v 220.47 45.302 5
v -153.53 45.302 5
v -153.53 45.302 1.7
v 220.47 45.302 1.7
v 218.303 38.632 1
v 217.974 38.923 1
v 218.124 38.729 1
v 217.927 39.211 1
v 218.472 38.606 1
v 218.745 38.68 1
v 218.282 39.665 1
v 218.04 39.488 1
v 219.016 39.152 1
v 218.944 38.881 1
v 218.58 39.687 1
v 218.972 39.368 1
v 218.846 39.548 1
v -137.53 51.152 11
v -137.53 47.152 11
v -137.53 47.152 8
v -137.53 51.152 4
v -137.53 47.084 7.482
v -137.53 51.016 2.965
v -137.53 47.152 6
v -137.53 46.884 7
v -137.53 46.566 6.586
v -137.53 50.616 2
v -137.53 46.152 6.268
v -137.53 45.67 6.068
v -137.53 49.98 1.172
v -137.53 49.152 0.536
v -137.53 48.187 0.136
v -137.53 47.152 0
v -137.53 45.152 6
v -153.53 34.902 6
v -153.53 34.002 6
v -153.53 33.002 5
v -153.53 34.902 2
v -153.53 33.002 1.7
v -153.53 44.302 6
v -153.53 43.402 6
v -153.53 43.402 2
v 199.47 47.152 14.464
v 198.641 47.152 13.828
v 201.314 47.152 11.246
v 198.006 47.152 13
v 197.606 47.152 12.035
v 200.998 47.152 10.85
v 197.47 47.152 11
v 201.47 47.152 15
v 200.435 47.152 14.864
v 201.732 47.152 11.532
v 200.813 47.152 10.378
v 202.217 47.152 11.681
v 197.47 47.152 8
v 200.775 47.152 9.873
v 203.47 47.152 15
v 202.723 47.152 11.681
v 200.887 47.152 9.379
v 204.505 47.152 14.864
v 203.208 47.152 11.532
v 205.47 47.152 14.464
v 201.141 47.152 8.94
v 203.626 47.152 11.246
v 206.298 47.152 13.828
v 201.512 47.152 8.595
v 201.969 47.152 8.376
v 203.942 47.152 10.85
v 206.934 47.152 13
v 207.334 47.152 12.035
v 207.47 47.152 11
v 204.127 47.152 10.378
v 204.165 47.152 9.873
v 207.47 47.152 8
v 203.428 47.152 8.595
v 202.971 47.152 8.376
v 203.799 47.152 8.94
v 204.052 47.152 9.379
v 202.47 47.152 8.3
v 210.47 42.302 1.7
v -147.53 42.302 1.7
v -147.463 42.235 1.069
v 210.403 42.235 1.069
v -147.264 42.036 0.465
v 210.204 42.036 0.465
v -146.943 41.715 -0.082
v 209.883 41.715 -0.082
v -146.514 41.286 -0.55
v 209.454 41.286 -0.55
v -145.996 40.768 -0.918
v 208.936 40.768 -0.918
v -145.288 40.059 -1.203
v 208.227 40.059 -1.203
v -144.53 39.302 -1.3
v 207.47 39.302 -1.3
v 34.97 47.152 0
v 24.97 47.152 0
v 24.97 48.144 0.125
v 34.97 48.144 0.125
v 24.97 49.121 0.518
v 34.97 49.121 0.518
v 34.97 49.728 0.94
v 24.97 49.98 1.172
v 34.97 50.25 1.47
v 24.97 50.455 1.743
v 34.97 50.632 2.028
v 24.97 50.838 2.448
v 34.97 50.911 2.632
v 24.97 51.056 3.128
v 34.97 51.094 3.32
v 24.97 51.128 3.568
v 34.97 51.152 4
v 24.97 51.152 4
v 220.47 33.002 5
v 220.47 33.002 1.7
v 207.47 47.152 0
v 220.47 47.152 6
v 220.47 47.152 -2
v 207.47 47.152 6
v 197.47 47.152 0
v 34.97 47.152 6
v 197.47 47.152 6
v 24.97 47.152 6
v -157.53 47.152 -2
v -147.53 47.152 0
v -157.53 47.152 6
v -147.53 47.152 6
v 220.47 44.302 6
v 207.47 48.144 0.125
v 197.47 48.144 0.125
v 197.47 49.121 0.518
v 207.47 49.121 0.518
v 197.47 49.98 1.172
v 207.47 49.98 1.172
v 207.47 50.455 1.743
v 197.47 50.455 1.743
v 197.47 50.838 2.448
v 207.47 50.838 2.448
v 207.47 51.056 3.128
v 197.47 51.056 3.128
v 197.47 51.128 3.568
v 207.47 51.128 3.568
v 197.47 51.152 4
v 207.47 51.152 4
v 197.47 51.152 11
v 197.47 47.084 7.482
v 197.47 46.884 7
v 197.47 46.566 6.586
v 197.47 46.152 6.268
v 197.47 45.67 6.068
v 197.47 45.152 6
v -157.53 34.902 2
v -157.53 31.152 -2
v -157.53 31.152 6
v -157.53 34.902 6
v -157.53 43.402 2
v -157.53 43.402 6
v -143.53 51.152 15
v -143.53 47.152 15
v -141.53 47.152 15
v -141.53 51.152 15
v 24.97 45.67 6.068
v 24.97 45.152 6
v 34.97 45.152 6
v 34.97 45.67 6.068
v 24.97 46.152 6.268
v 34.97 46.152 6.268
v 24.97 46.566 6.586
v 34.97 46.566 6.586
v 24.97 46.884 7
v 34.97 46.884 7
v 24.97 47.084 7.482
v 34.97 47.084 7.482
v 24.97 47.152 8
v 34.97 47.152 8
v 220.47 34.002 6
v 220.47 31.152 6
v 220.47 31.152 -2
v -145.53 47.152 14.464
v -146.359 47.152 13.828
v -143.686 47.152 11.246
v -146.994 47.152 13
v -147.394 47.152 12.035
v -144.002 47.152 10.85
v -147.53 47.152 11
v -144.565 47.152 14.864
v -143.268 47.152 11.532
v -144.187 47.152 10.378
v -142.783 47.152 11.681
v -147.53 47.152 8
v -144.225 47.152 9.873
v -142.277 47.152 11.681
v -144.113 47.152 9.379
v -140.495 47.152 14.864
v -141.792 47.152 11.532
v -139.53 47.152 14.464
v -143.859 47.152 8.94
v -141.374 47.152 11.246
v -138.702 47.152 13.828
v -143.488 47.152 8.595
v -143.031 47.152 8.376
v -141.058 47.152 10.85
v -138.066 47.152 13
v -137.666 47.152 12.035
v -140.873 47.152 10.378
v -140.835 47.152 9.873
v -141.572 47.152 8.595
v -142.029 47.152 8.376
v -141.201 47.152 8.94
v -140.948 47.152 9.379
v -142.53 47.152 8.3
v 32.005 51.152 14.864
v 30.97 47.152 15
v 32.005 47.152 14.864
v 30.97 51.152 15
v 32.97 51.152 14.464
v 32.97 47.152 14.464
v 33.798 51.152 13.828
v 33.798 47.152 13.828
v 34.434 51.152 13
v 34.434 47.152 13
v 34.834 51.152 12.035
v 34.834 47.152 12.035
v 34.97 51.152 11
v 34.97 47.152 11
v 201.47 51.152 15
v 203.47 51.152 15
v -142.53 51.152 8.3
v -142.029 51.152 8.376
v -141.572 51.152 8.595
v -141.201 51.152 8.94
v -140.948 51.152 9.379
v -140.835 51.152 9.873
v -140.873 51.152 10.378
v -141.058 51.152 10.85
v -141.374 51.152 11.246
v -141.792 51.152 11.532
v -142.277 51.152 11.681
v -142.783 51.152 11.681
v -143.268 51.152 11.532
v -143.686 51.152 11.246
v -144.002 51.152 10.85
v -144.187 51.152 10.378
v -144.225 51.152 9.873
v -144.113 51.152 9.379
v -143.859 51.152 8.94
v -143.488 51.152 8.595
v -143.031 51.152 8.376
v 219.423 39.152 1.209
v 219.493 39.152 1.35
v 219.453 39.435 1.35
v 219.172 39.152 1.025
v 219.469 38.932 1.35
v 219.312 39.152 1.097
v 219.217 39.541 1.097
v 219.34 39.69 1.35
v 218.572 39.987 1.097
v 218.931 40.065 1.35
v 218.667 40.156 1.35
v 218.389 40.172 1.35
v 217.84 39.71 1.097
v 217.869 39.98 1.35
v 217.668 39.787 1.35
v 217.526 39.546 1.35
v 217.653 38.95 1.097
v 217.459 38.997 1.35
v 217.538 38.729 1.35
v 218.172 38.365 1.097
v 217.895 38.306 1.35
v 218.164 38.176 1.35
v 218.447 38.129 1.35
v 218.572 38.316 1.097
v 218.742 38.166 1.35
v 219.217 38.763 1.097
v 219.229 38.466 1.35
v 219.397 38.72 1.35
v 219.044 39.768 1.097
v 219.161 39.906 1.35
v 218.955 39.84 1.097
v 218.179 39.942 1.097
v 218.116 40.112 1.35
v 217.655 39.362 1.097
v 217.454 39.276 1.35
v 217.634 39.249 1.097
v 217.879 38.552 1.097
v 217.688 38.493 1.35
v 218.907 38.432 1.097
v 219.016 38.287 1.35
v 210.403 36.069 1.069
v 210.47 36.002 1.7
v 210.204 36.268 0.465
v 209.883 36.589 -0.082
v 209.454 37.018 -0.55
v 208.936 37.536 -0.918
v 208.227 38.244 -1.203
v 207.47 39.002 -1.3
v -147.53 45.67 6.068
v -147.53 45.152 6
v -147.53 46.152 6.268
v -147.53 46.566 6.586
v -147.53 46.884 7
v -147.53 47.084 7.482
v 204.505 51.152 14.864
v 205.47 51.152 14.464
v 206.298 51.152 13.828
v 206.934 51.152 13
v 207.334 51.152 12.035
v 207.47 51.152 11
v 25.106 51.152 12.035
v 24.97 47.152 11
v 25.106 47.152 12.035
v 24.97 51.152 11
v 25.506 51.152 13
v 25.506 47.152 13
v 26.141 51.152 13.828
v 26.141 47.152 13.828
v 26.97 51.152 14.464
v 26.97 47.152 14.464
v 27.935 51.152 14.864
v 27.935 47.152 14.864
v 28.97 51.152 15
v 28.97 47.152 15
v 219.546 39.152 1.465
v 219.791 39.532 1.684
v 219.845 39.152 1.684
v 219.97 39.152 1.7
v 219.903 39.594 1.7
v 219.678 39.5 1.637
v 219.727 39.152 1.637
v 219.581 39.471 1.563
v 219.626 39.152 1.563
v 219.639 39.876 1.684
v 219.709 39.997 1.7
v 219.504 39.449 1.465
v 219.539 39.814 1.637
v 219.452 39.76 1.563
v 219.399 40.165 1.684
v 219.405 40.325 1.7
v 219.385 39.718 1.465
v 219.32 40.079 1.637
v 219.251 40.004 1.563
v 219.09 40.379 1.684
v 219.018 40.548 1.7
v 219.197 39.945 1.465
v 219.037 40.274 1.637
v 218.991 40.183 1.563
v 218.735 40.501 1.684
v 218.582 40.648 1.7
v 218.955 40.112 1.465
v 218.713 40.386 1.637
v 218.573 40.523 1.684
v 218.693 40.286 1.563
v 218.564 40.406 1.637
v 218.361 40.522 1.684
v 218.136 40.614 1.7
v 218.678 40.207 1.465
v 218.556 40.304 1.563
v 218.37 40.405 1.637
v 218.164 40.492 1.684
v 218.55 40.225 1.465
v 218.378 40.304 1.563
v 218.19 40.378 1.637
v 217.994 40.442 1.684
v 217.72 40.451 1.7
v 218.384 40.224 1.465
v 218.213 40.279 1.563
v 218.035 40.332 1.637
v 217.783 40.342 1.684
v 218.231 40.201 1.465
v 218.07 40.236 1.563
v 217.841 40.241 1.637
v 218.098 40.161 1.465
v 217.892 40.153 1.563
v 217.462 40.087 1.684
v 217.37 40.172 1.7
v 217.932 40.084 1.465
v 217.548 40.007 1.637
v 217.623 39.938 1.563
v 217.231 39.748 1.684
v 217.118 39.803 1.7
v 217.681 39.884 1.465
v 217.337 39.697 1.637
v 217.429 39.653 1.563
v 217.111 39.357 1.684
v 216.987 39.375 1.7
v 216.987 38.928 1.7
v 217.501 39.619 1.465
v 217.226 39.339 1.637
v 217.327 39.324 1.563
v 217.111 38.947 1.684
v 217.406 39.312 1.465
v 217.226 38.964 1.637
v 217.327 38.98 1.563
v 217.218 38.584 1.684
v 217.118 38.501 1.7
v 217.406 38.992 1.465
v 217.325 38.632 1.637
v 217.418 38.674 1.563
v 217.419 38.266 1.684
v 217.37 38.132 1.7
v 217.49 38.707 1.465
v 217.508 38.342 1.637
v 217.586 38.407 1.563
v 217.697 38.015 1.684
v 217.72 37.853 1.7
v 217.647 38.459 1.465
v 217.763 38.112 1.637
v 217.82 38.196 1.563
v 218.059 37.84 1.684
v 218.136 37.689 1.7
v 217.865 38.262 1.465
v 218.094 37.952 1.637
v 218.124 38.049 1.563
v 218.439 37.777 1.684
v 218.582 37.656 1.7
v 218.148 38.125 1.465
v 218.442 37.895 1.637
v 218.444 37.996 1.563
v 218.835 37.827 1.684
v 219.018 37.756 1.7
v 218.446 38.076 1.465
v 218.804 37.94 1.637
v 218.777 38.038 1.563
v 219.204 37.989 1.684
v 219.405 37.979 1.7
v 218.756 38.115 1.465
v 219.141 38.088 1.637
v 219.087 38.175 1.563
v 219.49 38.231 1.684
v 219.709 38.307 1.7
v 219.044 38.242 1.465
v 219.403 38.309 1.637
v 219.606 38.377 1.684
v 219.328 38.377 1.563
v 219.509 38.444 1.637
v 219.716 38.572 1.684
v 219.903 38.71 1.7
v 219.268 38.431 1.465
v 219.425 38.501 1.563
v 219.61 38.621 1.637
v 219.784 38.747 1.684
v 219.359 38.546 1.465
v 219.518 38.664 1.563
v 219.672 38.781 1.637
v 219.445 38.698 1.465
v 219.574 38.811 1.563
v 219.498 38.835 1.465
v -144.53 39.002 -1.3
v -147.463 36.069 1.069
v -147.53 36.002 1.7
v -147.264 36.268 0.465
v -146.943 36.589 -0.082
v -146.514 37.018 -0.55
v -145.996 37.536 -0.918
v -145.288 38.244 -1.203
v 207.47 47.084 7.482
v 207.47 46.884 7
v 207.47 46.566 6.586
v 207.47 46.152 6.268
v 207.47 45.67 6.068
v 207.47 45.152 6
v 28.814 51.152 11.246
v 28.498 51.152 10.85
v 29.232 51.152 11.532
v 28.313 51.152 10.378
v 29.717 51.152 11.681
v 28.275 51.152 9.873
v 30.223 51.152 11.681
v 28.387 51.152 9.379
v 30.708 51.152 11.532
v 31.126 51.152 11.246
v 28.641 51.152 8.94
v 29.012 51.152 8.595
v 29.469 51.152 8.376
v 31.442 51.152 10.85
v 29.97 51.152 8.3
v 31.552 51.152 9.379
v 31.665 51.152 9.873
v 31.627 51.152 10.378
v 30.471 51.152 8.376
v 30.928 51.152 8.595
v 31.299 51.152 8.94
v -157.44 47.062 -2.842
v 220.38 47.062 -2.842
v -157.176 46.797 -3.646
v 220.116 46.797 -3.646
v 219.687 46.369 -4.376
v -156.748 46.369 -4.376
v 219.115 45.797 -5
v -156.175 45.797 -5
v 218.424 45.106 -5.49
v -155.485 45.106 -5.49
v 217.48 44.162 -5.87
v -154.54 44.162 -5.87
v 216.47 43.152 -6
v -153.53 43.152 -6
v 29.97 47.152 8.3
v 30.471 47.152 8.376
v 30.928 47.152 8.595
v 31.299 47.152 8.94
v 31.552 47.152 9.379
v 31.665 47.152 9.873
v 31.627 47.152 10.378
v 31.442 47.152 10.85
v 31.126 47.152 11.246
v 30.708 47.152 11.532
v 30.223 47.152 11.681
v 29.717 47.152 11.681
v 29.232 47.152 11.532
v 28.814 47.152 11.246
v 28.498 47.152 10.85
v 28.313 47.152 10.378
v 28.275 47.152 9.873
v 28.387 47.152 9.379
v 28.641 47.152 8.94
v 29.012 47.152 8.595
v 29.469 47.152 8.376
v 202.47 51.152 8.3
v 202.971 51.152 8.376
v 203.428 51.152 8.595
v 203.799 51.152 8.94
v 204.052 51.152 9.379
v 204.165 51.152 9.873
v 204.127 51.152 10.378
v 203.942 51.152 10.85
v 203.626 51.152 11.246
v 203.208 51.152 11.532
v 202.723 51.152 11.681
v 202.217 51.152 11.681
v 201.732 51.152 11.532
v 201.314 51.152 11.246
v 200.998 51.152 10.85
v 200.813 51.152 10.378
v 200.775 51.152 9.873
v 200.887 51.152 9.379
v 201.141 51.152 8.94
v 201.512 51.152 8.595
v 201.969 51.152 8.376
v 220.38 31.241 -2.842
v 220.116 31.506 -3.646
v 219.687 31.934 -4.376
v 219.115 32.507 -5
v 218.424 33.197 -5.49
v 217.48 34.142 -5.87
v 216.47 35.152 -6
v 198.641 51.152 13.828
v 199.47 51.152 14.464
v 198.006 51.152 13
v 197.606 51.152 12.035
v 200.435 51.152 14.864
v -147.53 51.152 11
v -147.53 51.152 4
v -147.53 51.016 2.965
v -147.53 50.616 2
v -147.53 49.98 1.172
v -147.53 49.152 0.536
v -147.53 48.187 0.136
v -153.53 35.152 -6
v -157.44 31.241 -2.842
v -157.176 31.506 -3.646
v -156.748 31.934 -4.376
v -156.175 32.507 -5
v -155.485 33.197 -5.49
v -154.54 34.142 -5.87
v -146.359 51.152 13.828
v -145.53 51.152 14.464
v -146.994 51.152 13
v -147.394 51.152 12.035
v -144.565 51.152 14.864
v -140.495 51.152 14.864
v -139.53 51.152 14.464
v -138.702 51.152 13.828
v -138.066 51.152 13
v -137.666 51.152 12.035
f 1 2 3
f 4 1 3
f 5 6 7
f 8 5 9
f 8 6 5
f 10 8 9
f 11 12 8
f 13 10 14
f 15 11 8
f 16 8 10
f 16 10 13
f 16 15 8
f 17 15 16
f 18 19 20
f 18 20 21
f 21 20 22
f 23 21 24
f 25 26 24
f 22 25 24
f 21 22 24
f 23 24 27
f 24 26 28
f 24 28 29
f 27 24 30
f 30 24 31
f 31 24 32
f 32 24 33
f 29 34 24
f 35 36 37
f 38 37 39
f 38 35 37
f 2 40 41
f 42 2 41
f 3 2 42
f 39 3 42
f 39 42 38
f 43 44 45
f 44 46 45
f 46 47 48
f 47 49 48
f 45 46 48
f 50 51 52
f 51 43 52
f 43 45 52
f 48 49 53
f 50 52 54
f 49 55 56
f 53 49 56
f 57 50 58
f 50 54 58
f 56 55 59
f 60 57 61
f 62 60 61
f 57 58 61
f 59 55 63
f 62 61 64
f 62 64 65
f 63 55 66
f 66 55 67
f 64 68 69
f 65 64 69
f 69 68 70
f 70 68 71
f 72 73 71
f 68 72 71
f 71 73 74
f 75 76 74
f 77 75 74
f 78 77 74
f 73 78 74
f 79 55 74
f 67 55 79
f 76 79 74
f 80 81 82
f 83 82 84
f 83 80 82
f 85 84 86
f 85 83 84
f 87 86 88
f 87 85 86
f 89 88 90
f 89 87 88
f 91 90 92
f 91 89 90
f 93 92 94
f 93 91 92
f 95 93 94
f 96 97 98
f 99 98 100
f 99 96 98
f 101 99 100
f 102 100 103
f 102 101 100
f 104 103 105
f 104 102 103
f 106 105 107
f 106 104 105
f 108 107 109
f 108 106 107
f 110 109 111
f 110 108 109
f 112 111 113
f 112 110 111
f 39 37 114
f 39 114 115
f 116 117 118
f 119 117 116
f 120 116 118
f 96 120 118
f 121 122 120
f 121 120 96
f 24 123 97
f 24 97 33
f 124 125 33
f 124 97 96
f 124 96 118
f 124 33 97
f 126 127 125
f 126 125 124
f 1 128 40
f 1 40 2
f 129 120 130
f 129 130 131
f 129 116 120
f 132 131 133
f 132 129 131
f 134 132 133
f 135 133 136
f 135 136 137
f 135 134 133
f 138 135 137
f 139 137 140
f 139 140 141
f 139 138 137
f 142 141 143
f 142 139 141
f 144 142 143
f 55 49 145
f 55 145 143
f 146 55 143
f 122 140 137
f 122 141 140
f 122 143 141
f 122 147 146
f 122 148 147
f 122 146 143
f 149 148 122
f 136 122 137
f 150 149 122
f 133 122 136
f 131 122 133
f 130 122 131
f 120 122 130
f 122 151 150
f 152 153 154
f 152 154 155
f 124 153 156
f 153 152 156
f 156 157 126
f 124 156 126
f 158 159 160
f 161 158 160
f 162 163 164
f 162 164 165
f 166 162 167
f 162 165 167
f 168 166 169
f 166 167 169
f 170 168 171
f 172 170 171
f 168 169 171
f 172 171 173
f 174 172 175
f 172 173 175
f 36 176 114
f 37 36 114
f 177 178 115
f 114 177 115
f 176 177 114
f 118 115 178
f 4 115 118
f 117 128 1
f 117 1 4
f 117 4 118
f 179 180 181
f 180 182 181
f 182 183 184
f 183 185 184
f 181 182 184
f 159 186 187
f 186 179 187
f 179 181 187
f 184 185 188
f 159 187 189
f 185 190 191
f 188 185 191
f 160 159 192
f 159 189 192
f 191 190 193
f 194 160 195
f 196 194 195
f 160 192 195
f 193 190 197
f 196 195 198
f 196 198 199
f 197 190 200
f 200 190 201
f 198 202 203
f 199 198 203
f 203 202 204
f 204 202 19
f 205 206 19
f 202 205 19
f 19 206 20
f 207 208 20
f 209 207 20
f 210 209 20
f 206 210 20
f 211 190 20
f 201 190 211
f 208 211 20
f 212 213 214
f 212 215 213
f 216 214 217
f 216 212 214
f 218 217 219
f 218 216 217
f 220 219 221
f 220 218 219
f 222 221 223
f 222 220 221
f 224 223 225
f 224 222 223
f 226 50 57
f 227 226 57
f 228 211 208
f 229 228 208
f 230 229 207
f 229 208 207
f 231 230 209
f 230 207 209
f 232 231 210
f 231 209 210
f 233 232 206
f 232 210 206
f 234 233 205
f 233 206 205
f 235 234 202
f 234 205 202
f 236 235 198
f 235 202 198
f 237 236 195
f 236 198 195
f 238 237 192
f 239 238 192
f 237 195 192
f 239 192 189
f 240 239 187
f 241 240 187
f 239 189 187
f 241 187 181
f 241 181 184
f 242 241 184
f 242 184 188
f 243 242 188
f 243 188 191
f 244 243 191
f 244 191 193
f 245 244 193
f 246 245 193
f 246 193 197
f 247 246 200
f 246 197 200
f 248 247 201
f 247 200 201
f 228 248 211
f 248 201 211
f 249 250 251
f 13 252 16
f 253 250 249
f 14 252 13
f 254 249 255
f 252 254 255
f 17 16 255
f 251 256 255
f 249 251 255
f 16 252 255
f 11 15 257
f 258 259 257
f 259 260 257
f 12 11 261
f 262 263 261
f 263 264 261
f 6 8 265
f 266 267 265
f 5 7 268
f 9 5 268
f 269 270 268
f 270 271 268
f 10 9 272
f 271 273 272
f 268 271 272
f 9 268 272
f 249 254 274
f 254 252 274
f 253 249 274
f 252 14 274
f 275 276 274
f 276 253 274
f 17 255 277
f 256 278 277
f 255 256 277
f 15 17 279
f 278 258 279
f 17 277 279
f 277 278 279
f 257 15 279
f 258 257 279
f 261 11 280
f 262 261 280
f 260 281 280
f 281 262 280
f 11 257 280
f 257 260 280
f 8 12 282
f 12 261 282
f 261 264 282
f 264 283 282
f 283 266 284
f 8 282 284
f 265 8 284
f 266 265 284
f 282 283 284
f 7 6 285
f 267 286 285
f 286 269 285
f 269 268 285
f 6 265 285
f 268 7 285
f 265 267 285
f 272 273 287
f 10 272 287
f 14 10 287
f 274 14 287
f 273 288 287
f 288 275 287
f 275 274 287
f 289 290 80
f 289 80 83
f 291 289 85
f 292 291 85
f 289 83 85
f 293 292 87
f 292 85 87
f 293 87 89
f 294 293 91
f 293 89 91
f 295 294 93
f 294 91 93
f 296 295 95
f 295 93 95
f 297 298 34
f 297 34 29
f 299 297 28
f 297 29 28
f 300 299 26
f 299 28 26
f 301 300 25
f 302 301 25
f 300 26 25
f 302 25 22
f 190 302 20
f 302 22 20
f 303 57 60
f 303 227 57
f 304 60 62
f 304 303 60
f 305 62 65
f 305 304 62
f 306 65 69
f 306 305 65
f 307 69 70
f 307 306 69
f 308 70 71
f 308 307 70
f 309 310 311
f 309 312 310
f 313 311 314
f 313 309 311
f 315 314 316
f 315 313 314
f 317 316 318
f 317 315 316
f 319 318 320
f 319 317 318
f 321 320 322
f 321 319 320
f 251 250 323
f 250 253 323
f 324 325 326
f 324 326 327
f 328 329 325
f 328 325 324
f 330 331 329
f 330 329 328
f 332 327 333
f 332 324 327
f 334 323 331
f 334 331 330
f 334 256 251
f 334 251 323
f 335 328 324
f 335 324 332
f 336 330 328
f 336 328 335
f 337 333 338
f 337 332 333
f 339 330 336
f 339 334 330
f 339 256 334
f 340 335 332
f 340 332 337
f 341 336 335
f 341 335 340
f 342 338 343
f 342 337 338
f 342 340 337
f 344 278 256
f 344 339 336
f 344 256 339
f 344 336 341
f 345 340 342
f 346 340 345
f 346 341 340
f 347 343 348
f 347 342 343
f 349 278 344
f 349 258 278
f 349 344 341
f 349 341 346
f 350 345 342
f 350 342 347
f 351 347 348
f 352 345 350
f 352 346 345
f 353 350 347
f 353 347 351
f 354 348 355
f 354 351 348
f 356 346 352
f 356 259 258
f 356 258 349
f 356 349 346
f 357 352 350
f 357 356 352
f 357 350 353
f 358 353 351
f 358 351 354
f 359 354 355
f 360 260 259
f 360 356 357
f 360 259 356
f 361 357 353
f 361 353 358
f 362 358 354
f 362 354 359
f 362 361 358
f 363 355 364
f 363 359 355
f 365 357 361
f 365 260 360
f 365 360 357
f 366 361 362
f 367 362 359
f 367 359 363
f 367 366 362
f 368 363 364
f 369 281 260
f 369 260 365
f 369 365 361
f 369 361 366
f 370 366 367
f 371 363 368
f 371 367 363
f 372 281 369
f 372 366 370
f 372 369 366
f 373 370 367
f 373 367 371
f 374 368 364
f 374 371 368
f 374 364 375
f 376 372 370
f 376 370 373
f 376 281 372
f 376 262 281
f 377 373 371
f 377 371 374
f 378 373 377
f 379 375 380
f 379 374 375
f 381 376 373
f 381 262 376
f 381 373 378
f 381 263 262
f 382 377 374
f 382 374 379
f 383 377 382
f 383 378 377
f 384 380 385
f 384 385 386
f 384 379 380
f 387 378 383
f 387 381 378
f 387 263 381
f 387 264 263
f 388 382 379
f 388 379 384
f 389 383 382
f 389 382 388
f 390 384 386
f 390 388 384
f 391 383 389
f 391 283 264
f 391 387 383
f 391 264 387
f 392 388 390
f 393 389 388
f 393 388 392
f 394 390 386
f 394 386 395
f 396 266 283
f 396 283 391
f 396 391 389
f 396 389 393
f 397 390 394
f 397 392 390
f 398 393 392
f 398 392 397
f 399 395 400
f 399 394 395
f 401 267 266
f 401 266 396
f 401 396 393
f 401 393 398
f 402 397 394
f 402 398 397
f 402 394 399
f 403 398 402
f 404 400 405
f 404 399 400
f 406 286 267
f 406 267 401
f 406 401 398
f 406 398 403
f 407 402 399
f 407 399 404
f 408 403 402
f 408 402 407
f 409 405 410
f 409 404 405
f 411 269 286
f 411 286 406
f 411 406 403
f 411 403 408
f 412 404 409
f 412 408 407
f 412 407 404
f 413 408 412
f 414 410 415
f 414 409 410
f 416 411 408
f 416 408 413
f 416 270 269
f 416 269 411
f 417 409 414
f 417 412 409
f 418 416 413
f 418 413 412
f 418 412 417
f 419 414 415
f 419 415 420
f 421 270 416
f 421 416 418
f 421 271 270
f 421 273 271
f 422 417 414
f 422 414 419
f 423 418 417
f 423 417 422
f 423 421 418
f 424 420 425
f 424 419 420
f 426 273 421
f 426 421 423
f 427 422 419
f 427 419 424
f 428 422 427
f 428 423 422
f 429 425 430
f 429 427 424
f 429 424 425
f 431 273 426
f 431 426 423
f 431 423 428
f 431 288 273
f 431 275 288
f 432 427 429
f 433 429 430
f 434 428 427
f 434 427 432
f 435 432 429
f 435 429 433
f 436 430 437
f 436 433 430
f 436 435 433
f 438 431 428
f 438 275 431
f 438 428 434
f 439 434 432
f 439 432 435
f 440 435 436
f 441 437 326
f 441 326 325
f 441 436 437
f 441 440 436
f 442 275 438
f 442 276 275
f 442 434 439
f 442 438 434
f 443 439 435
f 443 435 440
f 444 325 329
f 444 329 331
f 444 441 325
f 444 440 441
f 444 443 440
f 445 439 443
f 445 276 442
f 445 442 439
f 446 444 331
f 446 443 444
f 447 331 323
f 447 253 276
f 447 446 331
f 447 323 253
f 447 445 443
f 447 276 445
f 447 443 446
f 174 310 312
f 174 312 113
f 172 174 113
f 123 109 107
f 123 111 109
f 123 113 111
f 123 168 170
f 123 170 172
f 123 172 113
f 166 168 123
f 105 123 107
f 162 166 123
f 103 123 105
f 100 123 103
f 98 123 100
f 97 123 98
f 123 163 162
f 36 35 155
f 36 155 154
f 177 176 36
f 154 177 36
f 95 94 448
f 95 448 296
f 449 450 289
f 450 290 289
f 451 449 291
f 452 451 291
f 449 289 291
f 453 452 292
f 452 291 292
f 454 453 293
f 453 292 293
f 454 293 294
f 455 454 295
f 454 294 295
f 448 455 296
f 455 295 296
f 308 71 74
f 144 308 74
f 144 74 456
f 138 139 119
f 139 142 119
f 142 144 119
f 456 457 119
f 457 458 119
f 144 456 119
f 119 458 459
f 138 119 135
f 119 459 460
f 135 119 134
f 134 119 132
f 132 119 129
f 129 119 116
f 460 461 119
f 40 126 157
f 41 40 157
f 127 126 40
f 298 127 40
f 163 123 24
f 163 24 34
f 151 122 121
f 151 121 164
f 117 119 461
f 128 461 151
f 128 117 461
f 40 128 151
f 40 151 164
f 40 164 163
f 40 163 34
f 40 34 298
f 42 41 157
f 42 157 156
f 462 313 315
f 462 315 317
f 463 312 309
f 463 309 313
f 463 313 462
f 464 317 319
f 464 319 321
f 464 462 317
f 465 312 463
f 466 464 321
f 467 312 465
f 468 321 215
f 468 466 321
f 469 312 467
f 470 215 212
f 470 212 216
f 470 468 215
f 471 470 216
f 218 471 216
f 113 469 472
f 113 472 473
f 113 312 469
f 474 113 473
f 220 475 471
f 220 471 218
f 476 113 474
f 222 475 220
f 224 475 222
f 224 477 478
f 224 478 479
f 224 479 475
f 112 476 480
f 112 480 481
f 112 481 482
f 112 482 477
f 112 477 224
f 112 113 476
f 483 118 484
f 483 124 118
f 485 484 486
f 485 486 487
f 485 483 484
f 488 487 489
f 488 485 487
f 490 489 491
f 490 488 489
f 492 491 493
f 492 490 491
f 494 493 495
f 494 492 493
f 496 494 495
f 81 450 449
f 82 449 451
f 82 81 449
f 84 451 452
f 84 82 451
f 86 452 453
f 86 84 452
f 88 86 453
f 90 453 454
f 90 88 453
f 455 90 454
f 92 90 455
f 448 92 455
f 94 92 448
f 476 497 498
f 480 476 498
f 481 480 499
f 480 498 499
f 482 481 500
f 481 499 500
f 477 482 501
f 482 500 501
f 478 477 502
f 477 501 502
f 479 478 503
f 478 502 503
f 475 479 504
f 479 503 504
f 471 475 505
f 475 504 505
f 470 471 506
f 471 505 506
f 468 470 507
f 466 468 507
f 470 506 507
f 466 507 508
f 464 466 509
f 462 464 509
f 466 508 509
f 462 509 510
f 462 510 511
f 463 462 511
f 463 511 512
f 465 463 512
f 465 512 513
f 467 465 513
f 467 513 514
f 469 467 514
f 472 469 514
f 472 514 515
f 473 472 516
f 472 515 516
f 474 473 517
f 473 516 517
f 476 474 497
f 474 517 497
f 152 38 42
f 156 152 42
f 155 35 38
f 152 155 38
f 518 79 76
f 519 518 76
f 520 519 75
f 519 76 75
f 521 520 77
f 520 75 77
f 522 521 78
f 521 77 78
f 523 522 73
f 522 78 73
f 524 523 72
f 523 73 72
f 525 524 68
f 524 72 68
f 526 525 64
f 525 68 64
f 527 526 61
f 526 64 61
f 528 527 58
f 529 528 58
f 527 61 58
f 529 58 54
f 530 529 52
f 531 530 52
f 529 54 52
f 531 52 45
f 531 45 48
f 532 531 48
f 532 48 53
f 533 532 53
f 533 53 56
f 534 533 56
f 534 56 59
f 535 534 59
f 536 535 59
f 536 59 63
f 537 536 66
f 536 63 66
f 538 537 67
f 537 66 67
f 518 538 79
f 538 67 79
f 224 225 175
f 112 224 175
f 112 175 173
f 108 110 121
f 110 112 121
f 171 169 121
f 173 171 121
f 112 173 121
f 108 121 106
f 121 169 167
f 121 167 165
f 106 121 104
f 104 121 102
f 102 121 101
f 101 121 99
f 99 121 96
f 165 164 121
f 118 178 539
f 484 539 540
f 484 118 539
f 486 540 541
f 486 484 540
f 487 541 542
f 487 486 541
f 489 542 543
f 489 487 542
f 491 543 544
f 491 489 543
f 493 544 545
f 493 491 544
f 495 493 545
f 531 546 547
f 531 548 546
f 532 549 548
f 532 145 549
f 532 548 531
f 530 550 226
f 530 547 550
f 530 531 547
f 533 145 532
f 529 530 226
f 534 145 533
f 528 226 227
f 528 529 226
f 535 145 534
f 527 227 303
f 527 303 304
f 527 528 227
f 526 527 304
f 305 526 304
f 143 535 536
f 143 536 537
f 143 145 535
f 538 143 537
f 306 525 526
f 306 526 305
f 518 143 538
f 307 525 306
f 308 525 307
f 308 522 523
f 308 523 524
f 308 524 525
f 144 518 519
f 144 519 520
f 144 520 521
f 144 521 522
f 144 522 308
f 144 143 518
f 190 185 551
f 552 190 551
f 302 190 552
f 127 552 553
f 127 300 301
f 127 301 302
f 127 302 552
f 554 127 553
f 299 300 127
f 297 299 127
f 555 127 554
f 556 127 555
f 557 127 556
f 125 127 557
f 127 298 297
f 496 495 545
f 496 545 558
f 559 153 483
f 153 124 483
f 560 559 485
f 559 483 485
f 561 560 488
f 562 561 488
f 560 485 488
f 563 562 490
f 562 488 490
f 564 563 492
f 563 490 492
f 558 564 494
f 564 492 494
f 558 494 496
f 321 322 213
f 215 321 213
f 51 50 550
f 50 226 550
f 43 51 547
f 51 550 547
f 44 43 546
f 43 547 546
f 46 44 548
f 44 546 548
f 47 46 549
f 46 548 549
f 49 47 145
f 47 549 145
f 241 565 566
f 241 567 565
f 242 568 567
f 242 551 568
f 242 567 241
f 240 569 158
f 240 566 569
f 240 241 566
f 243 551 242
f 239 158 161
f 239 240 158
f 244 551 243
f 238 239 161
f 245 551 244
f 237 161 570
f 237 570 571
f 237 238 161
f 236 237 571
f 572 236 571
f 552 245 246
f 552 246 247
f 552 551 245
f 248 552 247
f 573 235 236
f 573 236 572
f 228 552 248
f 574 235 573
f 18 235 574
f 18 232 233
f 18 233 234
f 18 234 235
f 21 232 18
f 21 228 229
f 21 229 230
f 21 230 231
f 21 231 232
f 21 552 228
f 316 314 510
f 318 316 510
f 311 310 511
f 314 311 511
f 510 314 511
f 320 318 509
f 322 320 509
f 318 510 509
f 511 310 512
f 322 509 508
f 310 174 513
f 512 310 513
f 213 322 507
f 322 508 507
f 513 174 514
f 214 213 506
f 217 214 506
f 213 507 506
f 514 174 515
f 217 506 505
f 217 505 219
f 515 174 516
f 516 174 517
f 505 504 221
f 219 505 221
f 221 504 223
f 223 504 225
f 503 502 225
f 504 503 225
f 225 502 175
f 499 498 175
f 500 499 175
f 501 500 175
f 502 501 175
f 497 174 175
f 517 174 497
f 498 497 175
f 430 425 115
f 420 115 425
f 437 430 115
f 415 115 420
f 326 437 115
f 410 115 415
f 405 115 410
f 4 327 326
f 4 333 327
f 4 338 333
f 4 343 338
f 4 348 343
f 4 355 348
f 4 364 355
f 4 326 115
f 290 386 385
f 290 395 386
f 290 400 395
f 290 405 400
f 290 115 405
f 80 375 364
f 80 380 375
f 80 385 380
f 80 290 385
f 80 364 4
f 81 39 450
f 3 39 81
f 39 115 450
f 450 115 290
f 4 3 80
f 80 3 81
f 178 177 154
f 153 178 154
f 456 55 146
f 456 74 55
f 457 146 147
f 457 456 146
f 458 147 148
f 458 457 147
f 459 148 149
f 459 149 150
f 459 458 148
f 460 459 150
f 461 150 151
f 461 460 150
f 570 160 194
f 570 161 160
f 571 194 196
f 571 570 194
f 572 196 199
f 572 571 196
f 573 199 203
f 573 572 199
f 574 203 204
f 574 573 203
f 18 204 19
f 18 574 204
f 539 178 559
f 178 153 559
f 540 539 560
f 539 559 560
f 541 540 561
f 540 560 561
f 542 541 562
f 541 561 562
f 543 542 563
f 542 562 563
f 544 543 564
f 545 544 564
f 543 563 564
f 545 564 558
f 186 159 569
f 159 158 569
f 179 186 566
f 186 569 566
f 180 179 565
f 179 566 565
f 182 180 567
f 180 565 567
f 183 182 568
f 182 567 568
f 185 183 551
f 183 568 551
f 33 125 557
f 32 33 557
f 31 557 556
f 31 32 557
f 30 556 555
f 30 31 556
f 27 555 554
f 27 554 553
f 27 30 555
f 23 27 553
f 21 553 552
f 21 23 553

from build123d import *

# Parameters (mm, degrees)
SKETCH1_W               = 378
SKETCH1_H               = 16
BOSS_EXTRUDE1_DEPTH     = 6
CUT_EXTRUDE1_DEPTH      = 381.976768496
CUT_EXTRUDE1_DEPTH_BACK = 374
SKETCH3_W               = 4.3
SKETCH3_H               = 12.3
BOSS_EXTRUDE2_DEPTH     = 374
BOSS_EXTRUDE3_DEPTH     = 374
SKETCH6_W               = 4
SKETCH6_H               = 8.5
CUT_EXTRUDE2_DEPTH      = 378.00835287
SKETCH13_W              = 10
SKETCH13_H              = 15
BOSS_EXTRUDE5_DEPTH     = 4
FILLET10_R              = 4
SKETCH14_R              = 1.7
CUT_EXTRUDE5_DEPTH      = 4
FILLET11_R              = 4
FILLET12_R              = 4
LPATTERN3_COUNT         = 3
LPATTERN3_PITCH         = 172.5
LPATTERN4_COUNT         = 3
LPATTERN4_PITCH         = 172.5
FILLET13_R              = 4
FILLET14_R              = 4
FILLET16_R              = 4
FILLET17_R              = 4
FILLET18_R              = 4
FILLET19_R              = 4
FILLET20_R              = 2
FILLET21_R              = 2
FILLET22_R              = 2
SKETCH17_W              = 378
SKETCH17_H              = 16
BOSS_EXTRUDE6_DEPTH     = 6
FILLET25_R              = 4
SKETCH18_R              = 1
CUT_EXTRUDE6_DEPTH      = 0.7
FILLET26_R              = 0.5
FILLET27_R              = 0.5
SKETCH19_W              = 358
SKETCH19_H              = 6.3
CUT_EXTRUDE7_DEPTH      = 3
FILLET28_R              = 3


with BuildPart() as part:
    # Sketch1 → Boss-Extrude1 (new body)
    with BuildSketch(Plane.XY):
        with Locations((31.46991404, 39.151862464)):
            Rectangle(SKETCH1_W, SKETCH1_H)
    extrude(amount=BOSS_EXTRUDE1_DEPTH)

    # Sketch3 → Cut-Extrude1 (cut, two sides: drawn at the far end of the back side and taken through both)
    with BuildSketch(Plane(origin=(220.46991404, 0, 0), x_dir=(0, 0, -1), z_dir=(1, 0, 0)).offset(-CUT_EXTRUDE1_DEPTH_BACK)):
        with Locations((-3.85, 39.151862464)):
            Rectangle(SKETCH3_W, SKETCH3_H)
    extrude(amount=CUT_EXTRUDE1_DEPTH + CUT_EXTRUDE1_DEPTH_BACK, mode=Mode.SUBTRACT)

    # Sketch4 → Boss-Extrude2 (add)
    with BuildSketch(Plane(origin=(220.46991404, 0, 0), x_dir=(0, 0, -1), z_dir=(1, 0, 0))):
        Polygon((-6, 33.001862464), (-6, 34.001862464), (-5, 33.001862464), align=None)
    extrude(amount=-BOSS_EXTRUDE2_DEPTH)

    # Sketch5 → Boss-Extrude3 (add)
    with BuildSketch(Plane(origin=(220.46991404, 0, 0), x_dir=(0, 0, -1), z_dir=(1, 0, 0))):
        Polygon((-6, 45.301862464), (-6, 44.301862464), (-5, 45.301862464), align=None)
    extrude(amount=-BOSS_EXTRUDE3_DEPTH)

    # Sketch6 → Cut-Extrude2 (cut, through all)
    with BuildSketch(Plane(origin=(-153.53008596, 0, 0), x_dir=(0, 0, -1), z_dir=(1, 0, 0))):
        with Locations((-4, 39.151862464)):
            Rectangle(SKETCH6_W, SKETCH6_H)
    extrude(amount=-CUT_EXTRUDE2_DEPTH, mode=Mode.SUBTRACT)

    # Sketch13 → Boss-Extrude5 (add)
    with BuildSketch(Plane(origin=(0, 47.151862464, 0), x_dir=(1, 0, 0), z_dir=(0, 1, 0))):
        with Locations((-142.53008596, -7.5)):
            Rectangle(SKETCH13_W, SKETCH13_H)
    boss_extrude5 = extrude(amount=BOSS_EXTRUDE5_DEPTH)

    # Fillet10
    fillet10_edges = [part.edges().sort_by_distance(p)[0] for p in [
        (-142.53008596, 51.151862464, 0),
    ]]
    fillet(fillet10_edges, radius=FILLET10_R)

    # Sketch14 → Cut-Extrude5 (cut)
    with BuildSketch(Plane.XZ.offset(-47.151862464)):
        with Locations(Location((-142.53008596, 10, 0), (0, 0, 270))):
            Circle(SKETCH14_R)
    cut_extrude5 = extrude(amount=-CUT_EXTRUDE5_DEPTH, mode=Mode.SUBTRACT)

    # Fillet11
    fillet11_edges = [part.edges().sort_by_distance(p)[0] for p in [
        (-137.53008596, 49.151862464, 15),
    ]]
    fillet(fillet11_edges, radius=FILLET11_R)

    # Fillet12
    fillet12_edges = [part.edges().sort_by_distance(p)[0] for p in [
        (-147.53008596, 49.151862464, 15),
    ]]
    fillet(fillet12_edges, radius=FILLET12_R)

    # LPattern3: Boss-Extrude5 ×3
    with Locations(*[(i * LPATTERN3_PITCH, 0, 0) for i in range(1, LPATTERN3_COUNT)]):
        add(boss_extrude5)

    # LPattern4: Cut-Extrude5 ×3
    with Locations(*[(i * LPATTERN4_PITCH, 0, 0) for i in range(1, LPATTERN4_COUNT)]):
        add(cut_extrude5, mode=Mode.SUBTRACT)

    # Fillet13
    fillet13_edges = [part.edges().sort_by_distance(p)[0] for p in [
        (29.96991404, 51.151862464, 0),
    ]]
    fillet(fillet13_edges, radius=FILLET13_R)

    # Fillet14
    fillet14_edges = [part.edges().sort_by_distance(p)[0] for p in [
        (202.46991404, 51.151862464, 0),
    ]]
    fillet(fillet14_edges, radius=FILLET14_R)

    # Fillet16
    fillet16_edges = [part.edges().sort_by_distance(p)[0] for p in [
        (24.96991404, 49.151862464, 15),
    ]]
    fillet(fillet16_edges, radius=FILLET16_R)

    # Fillet17
    fillet17_edges = [part.edges().sort_by_distance(p)[0] for p in [
        (34.96991404, 49.151862464, 15),
    ]]
    fillet(fillet17_edges, radius=FILLET17_R)

    # Fillet18
    fillet18_edges = [part.edges().sort_by_distance(p)[0] for p in [
        (207.46991404, 49.151862464, 15),
    ]]
    fillet(fillet18_edges, radius=FILLET18_R)

    # Fillet19
    fillet19_edges = [part.edges().sort_by_distance(p)[0] for p in [
        (197.46991404, 49.151862464, 15),
    ]]
    fillet(fillet19_edges, radius=FILLET19_R)

    # Fillet20
    fillet20_edges = [part.edges().sort_by_distance(p)[0] for p in [
        (202.46991404, 47.151862464, 6),
    ]]
    fillet(fillet20_edges, radius=FILLET20_R)

    # Fillet21
    fillet21_edges = [part.edges().sort_by_distance(p)[0] for p in [
        (29.96991404, 47.151862464, 6),
    ]]
    fillet(fillet21_edges, radius=FILLET21_R)

    # Fillet22
    fillet22_edges = [part.edges().sort_by_distance(p)[0] for p in [
        (-142.53008596, 47.151862464, 6),
    ]]
    fillet(fillet22_edges, radius=FILLET22_R)

    # Sketch17 → Boss-Extrude6 (add)
    with BuildSketch(Plane(origin=(0, 0, 0), x_dir=(-1, 0, 0), z_dir=(0, 0, -1))):
        with Locations((-31.46991404, 39.151862464)):
            Rectangle(SKETCH17_W, SKETCH17_H)
    extrude(amount=BOSS_EXTRUDE6_DEPTH)

    # Fillet25
    fillet25_edges = [part.edges().sort_by_distance(p)[0] for p in [
        (220.46991404, 39.151862464, -6),
        (31.46991404, 31.151862464, -6),
        (-157.53008596, 39.151862464, -6),
        (31.46991404, 47.151862464, -6),
    ]]
    fillet(fillet25_edges, radius=FILLET25_R)

    # Sketch18 → Cut-Extrude6 (cut)
    with BuildSketch(Plane.XY.offset(1.7)):
        with Locations((218.46991404, 39.151862464)):
            Circle(SKETCH18_R)
    extrude(amount=-CUT_EXTRUDE6_DEPTH, mode=Mode.SUBTRACT)

    # Fillet26
    fillet26_edges = [part.edges().sort_by_distance(p)[0] for p in [
        (217.46991404, 39.151862464, 1.7),
    ]]
    fillet(fillet26_edges, radius=FILLET26_R)

    # Fillet27
    fillet27_edges = [part.edges().sort_by_distance(p)[0] for p in [
        (217.46991404, 39.151862464, 1),
    ]]
    fillet(fillet27_edges, radius=FILLET27_R)

    # Sketch19 → Cut-Extrude7 (cut)
    with BuildSketch(Plane.XY.offset(1.7)):
        with Locations((31.46991404, 39.151862464)):
            Rectangle(SKETCH19_W, SKETCH19_H)
    extrude(amount=-CUT_EXTRUDE7_DEPTH, mode=Mode.SUBTRACT)

    # Fillet28
    fillet28_edges = [part.edges().sort_by_distance(p)[0] for p in [
        (31.46991404, 42.301862464, -1.3),
        (210.46991404, 39.151862464, -1.3),
        (31.46991404, 36.001862464, -1.3),
        (-147.53008596, 39.151862464, -1.3),
    ]]
    fillet(fillet28_edges, radius=FILLET28_R - 0.0001)  # a hair under: the kernel refuses the full size


solid = part.part
